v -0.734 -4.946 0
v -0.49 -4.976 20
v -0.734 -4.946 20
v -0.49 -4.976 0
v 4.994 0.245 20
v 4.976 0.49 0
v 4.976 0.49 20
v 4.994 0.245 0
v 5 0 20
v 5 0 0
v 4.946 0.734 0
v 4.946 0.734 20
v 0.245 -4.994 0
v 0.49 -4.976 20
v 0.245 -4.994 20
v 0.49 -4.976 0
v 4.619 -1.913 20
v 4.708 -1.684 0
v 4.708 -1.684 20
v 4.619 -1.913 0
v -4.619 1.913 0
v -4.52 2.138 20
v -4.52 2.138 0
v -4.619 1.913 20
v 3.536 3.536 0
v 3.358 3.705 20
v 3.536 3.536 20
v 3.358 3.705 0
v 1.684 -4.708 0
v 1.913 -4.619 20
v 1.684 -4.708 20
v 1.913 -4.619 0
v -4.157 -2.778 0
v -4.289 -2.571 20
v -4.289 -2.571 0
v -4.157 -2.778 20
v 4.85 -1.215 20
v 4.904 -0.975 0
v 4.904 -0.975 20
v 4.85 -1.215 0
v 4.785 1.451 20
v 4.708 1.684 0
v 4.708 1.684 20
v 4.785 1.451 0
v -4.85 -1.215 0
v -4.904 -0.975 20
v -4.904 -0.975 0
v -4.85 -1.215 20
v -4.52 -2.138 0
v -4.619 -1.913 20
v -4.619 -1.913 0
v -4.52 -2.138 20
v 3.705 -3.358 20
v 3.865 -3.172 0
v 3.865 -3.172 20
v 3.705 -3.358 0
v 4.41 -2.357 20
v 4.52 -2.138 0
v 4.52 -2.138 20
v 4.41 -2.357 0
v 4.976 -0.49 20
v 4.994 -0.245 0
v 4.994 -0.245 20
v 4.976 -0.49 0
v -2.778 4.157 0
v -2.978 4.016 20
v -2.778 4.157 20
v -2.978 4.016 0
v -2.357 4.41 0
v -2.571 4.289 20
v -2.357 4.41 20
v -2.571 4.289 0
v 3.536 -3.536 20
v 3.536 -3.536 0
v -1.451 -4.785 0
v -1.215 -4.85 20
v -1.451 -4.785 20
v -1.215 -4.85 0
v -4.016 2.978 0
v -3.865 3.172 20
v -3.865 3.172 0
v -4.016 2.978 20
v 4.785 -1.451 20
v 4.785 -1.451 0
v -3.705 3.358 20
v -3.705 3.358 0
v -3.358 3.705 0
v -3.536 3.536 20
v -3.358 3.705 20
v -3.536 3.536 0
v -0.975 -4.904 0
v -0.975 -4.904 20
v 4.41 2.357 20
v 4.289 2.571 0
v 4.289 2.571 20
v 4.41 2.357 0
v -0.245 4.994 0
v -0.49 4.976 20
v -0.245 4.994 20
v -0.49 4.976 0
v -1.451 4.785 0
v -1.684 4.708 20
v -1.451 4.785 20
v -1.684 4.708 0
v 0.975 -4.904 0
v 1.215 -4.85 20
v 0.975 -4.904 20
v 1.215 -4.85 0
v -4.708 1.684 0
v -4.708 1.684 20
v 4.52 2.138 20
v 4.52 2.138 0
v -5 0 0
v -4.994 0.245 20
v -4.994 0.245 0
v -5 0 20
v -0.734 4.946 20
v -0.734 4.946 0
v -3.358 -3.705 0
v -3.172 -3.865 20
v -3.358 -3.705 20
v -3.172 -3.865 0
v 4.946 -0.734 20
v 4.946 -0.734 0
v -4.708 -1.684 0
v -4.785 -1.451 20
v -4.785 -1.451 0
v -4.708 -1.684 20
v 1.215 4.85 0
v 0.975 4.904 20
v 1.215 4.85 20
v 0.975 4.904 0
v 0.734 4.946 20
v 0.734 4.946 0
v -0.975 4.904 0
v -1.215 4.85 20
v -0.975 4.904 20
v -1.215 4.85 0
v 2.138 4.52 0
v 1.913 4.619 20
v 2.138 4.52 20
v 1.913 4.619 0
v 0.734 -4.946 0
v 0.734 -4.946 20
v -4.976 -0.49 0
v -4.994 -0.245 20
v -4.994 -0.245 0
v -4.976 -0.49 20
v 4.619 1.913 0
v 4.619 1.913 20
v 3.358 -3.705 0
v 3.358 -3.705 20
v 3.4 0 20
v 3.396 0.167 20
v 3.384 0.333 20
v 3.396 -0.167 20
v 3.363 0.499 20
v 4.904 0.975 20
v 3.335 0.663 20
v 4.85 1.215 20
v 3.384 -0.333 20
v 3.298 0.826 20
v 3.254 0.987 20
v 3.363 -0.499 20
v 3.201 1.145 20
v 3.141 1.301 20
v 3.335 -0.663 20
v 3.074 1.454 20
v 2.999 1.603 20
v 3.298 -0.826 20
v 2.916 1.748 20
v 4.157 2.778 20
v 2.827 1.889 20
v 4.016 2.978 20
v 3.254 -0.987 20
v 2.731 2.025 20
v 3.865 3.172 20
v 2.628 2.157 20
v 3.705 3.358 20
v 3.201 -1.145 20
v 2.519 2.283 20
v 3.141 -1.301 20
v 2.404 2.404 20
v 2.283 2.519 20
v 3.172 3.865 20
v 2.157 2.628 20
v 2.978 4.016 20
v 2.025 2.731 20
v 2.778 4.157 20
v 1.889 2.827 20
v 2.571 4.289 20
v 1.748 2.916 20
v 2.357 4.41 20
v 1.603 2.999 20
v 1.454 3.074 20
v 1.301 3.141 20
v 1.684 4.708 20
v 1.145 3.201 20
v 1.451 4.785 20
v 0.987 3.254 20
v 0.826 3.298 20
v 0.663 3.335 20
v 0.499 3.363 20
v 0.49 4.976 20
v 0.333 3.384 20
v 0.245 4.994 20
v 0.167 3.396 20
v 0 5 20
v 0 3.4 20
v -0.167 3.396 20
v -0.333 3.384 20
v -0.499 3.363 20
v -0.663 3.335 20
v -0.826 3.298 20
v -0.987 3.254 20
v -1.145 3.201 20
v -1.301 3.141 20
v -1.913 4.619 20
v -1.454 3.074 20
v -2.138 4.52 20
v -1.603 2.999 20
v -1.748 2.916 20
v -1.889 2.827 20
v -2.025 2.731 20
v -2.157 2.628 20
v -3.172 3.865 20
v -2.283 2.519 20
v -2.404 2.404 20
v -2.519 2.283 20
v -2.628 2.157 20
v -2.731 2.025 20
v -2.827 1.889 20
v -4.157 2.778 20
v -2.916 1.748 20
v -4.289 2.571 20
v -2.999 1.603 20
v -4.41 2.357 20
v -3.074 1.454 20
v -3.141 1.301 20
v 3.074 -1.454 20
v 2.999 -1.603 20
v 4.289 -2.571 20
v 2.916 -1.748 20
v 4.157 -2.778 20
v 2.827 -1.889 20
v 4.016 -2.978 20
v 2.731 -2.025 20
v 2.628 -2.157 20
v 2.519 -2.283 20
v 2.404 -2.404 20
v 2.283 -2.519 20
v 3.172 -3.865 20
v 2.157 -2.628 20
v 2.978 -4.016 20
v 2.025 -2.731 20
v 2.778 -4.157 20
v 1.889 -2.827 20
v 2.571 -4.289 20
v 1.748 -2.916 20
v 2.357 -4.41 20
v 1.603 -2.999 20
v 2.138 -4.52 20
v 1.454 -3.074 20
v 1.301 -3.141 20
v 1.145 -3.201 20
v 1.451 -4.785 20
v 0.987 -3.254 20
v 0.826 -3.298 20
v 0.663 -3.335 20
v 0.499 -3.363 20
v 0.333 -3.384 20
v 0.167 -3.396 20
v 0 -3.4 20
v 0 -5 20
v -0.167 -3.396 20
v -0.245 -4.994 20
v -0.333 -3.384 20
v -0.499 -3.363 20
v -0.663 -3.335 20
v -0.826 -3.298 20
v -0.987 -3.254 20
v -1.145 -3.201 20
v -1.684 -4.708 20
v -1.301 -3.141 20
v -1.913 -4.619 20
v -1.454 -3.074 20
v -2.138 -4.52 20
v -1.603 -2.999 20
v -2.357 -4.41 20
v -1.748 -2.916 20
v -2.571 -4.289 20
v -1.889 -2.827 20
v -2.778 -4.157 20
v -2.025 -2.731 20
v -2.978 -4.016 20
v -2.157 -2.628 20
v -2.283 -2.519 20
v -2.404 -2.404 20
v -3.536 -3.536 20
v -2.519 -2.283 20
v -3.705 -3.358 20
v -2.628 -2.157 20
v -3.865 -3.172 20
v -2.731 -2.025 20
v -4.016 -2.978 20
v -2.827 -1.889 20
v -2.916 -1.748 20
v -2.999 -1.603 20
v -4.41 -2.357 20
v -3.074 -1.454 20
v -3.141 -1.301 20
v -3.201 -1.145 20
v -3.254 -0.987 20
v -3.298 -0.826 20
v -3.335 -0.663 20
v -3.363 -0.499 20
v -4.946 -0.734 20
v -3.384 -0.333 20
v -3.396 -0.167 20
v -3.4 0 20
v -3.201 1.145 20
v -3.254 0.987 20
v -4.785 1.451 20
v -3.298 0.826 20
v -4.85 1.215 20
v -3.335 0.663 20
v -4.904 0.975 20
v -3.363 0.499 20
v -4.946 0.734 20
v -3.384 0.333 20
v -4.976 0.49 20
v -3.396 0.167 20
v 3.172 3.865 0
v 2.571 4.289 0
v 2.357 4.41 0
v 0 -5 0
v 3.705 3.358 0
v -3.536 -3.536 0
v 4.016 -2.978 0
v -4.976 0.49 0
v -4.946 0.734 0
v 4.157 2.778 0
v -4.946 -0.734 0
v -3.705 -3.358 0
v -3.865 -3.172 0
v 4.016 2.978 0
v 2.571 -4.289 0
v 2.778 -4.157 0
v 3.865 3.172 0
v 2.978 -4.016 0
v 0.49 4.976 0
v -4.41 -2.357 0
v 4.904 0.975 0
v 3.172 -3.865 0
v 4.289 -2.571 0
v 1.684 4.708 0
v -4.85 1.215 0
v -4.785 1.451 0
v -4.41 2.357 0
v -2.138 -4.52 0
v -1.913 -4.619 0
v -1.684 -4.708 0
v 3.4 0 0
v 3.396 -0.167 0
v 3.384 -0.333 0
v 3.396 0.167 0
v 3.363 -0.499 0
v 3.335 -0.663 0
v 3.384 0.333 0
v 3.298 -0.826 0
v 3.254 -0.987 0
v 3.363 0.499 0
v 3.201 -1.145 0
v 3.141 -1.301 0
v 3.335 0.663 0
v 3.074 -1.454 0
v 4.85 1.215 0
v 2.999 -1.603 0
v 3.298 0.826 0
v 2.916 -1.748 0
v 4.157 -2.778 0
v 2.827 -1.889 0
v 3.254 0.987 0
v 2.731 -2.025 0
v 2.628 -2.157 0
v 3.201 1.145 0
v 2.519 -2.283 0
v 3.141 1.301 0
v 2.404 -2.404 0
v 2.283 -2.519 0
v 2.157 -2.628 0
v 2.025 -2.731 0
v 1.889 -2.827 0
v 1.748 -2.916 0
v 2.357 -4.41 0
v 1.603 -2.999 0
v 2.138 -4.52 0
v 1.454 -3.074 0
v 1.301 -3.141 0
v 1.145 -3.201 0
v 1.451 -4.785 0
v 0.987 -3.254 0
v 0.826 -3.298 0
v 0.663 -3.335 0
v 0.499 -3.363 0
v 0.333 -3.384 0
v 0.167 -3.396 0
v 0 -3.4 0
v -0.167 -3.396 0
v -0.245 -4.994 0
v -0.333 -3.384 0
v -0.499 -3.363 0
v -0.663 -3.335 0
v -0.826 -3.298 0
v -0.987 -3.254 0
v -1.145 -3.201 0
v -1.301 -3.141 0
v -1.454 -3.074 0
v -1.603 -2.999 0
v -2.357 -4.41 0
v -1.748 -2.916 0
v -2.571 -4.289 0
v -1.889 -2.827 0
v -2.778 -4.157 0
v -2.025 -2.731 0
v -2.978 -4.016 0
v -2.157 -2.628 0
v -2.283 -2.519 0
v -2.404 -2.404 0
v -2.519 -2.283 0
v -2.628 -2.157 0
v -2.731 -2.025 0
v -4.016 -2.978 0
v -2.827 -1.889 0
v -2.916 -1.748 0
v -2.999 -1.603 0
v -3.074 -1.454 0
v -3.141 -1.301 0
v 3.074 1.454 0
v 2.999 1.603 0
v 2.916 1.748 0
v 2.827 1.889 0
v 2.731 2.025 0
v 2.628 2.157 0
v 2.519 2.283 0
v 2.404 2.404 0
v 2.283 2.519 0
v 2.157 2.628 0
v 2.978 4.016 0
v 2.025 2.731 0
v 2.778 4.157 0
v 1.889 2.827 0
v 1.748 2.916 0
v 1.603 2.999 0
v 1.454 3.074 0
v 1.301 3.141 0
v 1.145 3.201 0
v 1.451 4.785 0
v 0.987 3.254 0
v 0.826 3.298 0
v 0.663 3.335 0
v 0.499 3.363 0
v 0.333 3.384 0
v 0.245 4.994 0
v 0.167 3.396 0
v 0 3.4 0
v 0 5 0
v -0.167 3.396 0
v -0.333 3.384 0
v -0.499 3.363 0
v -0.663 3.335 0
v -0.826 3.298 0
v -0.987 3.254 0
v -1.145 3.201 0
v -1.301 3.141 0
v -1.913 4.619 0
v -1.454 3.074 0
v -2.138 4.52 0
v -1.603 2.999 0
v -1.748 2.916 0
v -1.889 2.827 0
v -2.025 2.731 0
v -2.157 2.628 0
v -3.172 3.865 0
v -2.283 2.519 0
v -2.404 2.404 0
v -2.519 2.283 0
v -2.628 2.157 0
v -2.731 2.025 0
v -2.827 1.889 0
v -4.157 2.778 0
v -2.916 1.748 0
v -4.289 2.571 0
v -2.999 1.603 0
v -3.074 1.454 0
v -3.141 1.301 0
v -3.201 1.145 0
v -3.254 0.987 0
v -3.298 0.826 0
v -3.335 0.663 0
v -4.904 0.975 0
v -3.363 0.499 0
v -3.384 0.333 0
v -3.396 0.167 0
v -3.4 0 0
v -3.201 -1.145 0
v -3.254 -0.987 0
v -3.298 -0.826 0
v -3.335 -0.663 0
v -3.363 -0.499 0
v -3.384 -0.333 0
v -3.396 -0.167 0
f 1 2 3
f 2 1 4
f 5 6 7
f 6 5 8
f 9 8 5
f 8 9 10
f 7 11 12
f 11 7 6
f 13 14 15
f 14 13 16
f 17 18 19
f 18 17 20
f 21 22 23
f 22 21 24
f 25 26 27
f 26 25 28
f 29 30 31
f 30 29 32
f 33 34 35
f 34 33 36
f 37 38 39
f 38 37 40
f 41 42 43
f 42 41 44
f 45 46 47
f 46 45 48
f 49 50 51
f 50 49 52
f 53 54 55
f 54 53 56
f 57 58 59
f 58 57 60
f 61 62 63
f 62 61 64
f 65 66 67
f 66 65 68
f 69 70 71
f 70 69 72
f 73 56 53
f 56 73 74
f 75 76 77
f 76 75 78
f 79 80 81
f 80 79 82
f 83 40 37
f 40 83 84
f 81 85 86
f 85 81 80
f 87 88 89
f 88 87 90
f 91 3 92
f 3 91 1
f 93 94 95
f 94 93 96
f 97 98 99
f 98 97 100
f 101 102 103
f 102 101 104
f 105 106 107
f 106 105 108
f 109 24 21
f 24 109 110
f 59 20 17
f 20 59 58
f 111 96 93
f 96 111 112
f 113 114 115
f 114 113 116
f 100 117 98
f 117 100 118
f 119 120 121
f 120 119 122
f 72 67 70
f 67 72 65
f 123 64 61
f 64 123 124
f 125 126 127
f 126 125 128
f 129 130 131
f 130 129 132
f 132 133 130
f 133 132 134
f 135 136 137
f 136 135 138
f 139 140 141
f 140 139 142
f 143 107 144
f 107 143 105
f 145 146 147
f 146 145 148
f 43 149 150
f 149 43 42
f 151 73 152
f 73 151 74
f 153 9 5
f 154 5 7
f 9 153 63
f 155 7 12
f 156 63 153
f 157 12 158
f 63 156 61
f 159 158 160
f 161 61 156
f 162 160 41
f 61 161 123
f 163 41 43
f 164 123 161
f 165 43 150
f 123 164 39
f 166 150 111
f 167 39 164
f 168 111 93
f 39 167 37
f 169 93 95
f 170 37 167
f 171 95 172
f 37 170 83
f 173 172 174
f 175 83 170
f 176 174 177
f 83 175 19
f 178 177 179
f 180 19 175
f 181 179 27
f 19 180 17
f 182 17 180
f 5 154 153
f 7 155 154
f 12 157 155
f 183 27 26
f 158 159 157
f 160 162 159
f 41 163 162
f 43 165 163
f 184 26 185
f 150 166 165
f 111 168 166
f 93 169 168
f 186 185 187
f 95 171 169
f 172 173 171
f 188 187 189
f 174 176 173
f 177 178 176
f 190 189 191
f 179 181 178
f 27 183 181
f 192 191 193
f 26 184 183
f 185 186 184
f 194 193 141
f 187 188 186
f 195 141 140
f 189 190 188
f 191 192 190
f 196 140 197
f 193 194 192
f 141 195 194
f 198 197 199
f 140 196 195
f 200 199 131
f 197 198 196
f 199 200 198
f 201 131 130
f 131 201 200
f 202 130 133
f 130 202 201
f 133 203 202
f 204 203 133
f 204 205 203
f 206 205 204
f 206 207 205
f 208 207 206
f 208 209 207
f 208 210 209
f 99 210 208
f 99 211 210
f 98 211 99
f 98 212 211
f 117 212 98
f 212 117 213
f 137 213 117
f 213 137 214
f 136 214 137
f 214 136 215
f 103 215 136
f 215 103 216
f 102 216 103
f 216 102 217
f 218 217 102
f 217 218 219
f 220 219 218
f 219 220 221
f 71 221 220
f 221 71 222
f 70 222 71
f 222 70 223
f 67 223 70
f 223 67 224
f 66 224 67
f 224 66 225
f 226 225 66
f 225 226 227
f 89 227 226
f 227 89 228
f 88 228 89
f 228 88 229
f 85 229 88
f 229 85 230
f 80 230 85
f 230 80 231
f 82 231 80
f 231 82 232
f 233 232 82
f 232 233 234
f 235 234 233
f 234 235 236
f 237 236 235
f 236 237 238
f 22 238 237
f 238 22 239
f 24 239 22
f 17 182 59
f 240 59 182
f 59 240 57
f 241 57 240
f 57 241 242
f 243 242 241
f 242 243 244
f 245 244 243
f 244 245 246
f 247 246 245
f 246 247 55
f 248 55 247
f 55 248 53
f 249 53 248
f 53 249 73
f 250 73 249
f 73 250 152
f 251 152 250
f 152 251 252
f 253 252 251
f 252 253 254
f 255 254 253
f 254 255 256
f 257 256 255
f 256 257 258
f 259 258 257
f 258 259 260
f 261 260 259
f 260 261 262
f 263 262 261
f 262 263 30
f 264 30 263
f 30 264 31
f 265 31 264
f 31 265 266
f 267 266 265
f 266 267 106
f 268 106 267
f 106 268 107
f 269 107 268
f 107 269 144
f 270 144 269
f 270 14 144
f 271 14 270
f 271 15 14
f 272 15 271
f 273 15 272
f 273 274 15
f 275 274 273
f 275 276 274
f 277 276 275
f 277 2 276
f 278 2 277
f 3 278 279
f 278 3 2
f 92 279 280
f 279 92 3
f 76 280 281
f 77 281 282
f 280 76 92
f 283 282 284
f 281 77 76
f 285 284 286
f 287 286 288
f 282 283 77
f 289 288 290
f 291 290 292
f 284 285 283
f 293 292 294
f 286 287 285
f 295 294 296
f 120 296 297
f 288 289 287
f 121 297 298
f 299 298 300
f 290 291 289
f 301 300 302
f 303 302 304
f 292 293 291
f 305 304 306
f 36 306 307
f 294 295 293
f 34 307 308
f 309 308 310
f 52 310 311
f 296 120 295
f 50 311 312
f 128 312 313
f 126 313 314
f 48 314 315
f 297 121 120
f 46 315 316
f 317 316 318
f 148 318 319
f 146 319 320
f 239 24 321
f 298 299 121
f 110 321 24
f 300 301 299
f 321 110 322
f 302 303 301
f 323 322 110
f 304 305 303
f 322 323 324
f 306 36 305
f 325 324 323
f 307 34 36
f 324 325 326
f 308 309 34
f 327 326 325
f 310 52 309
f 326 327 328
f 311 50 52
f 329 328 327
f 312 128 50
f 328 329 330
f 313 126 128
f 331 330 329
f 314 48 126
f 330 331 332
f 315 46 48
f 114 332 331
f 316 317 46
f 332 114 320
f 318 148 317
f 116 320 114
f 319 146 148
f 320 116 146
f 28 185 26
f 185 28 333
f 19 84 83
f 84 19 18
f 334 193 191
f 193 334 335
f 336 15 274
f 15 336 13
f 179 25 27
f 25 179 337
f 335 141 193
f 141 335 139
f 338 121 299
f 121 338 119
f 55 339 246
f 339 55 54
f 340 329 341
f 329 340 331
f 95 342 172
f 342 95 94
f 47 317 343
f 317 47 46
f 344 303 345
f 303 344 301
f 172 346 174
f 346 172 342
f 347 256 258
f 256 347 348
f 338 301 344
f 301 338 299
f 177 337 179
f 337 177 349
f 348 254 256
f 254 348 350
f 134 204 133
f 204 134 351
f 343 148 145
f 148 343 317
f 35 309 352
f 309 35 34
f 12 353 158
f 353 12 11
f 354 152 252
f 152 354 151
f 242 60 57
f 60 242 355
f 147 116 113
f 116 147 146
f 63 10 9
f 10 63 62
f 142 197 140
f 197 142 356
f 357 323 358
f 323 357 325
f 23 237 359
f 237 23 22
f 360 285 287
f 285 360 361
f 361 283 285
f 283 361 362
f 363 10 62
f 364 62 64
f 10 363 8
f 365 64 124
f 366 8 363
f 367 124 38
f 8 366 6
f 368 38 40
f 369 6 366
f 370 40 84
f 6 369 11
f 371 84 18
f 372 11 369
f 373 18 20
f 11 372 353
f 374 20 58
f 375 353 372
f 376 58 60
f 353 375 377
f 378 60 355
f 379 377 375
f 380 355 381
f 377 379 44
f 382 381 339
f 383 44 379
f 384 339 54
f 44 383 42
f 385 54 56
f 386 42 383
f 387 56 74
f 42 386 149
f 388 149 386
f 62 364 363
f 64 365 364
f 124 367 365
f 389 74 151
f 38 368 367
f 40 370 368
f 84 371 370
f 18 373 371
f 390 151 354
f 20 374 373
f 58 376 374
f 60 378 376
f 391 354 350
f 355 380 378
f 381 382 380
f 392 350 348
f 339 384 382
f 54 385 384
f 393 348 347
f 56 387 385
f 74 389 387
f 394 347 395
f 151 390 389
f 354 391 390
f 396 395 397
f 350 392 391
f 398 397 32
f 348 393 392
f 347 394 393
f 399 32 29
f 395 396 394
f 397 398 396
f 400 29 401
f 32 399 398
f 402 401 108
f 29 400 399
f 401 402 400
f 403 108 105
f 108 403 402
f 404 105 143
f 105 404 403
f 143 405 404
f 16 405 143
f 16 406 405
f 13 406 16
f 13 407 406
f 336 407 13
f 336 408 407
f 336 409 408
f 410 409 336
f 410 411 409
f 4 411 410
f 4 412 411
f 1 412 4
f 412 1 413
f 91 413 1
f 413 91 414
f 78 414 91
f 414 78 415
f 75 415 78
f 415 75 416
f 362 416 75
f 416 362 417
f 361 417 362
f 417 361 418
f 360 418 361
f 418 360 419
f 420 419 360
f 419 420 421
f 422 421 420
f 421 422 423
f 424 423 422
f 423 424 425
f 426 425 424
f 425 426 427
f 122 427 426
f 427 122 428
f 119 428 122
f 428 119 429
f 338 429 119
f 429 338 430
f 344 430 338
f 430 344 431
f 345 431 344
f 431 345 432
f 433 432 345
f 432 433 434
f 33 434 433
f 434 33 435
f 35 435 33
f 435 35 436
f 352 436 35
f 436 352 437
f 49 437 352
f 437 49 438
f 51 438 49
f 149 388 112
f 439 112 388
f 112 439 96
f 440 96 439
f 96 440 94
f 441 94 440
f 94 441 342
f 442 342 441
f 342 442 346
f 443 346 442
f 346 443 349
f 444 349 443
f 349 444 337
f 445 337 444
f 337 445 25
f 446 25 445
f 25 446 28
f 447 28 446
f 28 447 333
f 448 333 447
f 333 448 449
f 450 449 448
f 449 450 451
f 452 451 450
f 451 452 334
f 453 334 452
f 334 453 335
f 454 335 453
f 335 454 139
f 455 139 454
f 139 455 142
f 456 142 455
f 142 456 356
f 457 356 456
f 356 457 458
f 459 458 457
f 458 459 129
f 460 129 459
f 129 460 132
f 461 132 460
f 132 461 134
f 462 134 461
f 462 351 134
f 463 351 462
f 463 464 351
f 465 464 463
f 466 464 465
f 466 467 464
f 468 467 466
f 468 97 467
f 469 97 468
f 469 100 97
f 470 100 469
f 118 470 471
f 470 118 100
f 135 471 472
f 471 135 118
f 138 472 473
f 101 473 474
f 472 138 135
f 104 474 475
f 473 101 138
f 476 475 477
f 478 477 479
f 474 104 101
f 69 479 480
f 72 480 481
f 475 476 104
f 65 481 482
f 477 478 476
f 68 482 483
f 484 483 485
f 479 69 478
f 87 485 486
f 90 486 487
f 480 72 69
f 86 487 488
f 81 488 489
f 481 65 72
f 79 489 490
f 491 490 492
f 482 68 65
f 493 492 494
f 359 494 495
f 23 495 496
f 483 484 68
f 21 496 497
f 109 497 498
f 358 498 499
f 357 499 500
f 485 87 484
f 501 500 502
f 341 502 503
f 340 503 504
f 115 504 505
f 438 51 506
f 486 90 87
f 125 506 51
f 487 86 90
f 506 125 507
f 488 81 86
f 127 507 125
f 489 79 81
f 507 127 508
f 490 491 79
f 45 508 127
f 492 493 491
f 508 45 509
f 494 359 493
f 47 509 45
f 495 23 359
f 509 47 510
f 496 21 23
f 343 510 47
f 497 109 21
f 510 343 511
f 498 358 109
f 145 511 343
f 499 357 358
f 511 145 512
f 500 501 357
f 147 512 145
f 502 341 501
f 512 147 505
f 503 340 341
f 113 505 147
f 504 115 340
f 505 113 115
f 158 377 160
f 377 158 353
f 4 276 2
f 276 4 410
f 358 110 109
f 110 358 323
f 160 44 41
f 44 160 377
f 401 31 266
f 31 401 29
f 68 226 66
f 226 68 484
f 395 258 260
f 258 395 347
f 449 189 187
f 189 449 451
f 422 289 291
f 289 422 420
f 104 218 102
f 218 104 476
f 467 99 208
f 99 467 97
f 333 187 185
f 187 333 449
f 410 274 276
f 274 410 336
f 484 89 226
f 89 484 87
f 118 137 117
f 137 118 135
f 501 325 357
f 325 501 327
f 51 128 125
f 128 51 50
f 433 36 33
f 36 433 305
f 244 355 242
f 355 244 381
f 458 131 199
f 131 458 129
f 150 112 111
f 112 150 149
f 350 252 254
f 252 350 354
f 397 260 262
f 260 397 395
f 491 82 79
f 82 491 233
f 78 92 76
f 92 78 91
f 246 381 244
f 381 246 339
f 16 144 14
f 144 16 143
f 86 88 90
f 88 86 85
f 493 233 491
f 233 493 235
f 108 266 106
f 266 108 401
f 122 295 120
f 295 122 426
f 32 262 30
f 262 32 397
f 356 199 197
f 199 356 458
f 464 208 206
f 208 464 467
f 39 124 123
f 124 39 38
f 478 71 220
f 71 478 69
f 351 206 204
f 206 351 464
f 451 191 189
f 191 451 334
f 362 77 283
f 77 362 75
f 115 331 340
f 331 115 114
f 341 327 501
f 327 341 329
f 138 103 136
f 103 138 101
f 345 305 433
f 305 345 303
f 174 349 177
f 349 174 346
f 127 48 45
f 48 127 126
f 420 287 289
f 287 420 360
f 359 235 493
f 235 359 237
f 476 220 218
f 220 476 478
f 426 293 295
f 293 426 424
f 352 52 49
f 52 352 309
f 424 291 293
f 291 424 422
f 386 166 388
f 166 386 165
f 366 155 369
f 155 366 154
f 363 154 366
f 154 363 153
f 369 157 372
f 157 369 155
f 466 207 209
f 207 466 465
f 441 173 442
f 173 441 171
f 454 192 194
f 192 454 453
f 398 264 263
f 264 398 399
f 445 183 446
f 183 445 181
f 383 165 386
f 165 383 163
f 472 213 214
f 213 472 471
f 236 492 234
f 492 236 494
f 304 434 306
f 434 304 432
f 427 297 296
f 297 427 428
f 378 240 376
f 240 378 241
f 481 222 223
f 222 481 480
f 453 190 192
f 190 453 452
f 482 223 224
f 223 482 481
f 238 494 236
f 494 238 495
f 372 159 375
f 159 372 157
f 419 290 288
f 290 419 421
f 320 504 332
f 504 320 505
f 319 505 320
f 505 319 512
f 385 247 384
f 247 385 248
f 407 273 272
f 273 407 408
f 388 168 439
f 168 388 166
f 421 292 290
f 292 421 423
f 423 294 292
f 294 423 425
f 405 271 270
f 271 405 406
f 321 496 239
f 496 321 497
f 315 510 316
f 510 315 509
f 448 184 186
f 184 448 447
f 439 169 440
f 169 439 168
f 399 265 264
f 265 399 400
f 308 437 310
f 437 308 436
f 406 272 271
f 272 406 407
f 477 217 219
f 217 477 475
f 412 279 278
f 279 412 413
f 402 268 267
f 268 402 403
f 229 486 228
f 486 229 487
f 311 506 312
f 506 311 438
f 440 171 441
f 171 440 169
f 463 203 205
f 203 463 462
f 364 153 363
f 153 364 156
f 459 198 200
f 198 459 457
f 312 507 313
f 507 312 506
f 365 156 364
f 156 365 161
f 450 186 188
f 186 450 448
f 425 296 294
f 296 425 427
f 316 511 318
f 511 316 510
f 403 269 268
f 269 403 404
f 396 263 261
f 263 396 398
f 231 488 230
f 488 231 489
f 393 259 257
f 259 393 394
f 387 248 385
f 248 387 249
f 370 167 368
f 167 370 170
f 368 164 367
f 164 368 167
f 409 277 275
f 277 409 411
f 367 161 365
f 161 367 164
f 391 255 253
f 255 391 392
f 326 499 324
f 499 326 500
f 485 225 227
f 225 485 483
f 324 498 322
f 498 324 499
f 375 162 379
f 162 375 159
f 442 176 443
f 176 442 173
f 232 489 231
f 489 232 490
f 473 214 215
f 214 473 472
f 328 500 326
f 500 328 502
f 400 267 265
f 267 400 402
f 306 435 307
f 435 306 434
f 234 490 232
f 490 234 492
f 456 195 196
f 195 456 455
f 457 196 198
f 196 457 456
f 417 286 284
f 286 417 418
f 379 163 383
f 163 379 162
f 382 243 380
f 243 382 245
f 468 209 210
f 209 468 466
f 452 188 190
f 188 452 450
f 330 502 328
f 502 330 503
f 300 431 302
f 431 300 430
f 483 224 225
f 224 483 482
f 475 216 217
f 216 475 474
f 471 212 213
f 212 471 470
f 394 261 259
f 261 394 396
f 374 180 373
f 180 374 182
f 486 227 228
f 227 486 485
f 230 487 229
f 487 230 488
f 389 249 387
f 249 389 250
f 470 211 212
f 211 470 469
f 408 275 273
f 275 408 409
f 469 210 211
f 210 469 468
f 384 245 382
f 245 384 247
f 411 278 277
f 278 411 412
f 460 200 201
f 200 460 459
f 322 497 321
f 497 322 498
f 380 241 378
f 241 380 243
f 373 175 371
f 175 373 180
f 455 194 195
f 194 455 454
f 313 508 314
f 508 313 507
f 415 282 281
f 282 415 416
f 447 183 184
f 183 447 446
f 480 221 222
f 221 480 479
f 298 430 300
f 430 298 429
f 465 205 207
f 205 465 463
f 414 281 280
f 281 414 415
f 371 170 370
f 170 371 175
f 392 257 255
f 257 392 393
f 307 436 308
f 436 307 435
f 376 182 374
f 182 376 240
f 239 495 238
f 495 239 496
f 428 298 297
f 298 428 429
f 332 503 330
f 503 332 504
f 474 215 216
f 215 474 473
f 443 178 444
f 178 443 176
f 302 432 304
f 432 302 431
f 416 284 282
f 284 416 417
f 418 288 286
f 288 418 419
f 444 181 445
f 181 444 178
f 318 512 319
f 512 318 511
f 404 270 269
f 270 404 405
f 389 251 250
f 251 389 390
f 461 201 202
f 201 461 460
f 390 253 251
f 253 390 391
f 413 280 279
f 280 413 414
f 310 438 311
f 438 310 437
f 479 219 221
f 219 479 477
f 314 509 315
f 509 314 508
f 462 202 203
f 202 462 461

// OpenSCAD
// Small Lab Funnel
// Designed for FDM printing: printed upright, spout at bottom.

// --- Dimensions ---
spout_od     = 10.0;    // Outer diameter of the spout (mm)
spout_height = 20.0;    // Height of the spout (mm)
rim_od       = 60.0;    // Outer diameter at the top rim (mm)
funnel_height = 30.0;   // Height of the conical section (50mm total - 20mm spout)
wall_thick   = 1.6;     // Wall thickness (mm)

// --- Derived Dimensions ---
total_height = spout_height + funnel_height;
spout_id     = spout_od - (2 * wall_thick);
rim_id       = rim_od - (2 * wall_thick);

$fn = 128;

// --- Geometry Construction ---

// The main body is a union of the spout cylinder and the conical frustum.
// We use a difference to subtract the internal hollow space.

module funnel_body() {
    union() {
        // Spout section
        cylinder(h = spout_height, d = spout_od);
        
        // Conical section
        // We use a polygon with rotate_extrude to create the frustum profile
        rotate_extrude() {
            polygon(points = [
                [spout_od / 2, 0],              // Bottom of cone (at z=20)
                [rim_od / 2, funnel_height]     // Top of cone (at z=50)
            ]);
        }
    }
}

module internal_hollow() {
    // The hollow part consists of the spout bore and the conical bore.
    // We extend the shapes slightly to ensure clean cuts.
    
    // Spout bore
    translate([0, 0, -1])
        cylinder(h = spout_height + 2, d = spout_id);
    
    // Conical bore
    // We calculate the profile of the internal cone
    rotate_extrude() {
        polygon(points = [
            [spout_id / 2, -1],              // Start slightly below spout junction
            [rim_id / 2, funnel_height + 1] // End slightly above rim
        ]);
    }
}

// Final Assembly
difference() {
    // The solid outer shell
    translate([0, 0, 0]) funnel_body();
    
    // The hollow interior
    translate([0, 0, 0]) internal_hollow();
}

// Note: The part is centered on X and Y. 
// It sits on the XY plane (z=0) at the bottom of the spout.
